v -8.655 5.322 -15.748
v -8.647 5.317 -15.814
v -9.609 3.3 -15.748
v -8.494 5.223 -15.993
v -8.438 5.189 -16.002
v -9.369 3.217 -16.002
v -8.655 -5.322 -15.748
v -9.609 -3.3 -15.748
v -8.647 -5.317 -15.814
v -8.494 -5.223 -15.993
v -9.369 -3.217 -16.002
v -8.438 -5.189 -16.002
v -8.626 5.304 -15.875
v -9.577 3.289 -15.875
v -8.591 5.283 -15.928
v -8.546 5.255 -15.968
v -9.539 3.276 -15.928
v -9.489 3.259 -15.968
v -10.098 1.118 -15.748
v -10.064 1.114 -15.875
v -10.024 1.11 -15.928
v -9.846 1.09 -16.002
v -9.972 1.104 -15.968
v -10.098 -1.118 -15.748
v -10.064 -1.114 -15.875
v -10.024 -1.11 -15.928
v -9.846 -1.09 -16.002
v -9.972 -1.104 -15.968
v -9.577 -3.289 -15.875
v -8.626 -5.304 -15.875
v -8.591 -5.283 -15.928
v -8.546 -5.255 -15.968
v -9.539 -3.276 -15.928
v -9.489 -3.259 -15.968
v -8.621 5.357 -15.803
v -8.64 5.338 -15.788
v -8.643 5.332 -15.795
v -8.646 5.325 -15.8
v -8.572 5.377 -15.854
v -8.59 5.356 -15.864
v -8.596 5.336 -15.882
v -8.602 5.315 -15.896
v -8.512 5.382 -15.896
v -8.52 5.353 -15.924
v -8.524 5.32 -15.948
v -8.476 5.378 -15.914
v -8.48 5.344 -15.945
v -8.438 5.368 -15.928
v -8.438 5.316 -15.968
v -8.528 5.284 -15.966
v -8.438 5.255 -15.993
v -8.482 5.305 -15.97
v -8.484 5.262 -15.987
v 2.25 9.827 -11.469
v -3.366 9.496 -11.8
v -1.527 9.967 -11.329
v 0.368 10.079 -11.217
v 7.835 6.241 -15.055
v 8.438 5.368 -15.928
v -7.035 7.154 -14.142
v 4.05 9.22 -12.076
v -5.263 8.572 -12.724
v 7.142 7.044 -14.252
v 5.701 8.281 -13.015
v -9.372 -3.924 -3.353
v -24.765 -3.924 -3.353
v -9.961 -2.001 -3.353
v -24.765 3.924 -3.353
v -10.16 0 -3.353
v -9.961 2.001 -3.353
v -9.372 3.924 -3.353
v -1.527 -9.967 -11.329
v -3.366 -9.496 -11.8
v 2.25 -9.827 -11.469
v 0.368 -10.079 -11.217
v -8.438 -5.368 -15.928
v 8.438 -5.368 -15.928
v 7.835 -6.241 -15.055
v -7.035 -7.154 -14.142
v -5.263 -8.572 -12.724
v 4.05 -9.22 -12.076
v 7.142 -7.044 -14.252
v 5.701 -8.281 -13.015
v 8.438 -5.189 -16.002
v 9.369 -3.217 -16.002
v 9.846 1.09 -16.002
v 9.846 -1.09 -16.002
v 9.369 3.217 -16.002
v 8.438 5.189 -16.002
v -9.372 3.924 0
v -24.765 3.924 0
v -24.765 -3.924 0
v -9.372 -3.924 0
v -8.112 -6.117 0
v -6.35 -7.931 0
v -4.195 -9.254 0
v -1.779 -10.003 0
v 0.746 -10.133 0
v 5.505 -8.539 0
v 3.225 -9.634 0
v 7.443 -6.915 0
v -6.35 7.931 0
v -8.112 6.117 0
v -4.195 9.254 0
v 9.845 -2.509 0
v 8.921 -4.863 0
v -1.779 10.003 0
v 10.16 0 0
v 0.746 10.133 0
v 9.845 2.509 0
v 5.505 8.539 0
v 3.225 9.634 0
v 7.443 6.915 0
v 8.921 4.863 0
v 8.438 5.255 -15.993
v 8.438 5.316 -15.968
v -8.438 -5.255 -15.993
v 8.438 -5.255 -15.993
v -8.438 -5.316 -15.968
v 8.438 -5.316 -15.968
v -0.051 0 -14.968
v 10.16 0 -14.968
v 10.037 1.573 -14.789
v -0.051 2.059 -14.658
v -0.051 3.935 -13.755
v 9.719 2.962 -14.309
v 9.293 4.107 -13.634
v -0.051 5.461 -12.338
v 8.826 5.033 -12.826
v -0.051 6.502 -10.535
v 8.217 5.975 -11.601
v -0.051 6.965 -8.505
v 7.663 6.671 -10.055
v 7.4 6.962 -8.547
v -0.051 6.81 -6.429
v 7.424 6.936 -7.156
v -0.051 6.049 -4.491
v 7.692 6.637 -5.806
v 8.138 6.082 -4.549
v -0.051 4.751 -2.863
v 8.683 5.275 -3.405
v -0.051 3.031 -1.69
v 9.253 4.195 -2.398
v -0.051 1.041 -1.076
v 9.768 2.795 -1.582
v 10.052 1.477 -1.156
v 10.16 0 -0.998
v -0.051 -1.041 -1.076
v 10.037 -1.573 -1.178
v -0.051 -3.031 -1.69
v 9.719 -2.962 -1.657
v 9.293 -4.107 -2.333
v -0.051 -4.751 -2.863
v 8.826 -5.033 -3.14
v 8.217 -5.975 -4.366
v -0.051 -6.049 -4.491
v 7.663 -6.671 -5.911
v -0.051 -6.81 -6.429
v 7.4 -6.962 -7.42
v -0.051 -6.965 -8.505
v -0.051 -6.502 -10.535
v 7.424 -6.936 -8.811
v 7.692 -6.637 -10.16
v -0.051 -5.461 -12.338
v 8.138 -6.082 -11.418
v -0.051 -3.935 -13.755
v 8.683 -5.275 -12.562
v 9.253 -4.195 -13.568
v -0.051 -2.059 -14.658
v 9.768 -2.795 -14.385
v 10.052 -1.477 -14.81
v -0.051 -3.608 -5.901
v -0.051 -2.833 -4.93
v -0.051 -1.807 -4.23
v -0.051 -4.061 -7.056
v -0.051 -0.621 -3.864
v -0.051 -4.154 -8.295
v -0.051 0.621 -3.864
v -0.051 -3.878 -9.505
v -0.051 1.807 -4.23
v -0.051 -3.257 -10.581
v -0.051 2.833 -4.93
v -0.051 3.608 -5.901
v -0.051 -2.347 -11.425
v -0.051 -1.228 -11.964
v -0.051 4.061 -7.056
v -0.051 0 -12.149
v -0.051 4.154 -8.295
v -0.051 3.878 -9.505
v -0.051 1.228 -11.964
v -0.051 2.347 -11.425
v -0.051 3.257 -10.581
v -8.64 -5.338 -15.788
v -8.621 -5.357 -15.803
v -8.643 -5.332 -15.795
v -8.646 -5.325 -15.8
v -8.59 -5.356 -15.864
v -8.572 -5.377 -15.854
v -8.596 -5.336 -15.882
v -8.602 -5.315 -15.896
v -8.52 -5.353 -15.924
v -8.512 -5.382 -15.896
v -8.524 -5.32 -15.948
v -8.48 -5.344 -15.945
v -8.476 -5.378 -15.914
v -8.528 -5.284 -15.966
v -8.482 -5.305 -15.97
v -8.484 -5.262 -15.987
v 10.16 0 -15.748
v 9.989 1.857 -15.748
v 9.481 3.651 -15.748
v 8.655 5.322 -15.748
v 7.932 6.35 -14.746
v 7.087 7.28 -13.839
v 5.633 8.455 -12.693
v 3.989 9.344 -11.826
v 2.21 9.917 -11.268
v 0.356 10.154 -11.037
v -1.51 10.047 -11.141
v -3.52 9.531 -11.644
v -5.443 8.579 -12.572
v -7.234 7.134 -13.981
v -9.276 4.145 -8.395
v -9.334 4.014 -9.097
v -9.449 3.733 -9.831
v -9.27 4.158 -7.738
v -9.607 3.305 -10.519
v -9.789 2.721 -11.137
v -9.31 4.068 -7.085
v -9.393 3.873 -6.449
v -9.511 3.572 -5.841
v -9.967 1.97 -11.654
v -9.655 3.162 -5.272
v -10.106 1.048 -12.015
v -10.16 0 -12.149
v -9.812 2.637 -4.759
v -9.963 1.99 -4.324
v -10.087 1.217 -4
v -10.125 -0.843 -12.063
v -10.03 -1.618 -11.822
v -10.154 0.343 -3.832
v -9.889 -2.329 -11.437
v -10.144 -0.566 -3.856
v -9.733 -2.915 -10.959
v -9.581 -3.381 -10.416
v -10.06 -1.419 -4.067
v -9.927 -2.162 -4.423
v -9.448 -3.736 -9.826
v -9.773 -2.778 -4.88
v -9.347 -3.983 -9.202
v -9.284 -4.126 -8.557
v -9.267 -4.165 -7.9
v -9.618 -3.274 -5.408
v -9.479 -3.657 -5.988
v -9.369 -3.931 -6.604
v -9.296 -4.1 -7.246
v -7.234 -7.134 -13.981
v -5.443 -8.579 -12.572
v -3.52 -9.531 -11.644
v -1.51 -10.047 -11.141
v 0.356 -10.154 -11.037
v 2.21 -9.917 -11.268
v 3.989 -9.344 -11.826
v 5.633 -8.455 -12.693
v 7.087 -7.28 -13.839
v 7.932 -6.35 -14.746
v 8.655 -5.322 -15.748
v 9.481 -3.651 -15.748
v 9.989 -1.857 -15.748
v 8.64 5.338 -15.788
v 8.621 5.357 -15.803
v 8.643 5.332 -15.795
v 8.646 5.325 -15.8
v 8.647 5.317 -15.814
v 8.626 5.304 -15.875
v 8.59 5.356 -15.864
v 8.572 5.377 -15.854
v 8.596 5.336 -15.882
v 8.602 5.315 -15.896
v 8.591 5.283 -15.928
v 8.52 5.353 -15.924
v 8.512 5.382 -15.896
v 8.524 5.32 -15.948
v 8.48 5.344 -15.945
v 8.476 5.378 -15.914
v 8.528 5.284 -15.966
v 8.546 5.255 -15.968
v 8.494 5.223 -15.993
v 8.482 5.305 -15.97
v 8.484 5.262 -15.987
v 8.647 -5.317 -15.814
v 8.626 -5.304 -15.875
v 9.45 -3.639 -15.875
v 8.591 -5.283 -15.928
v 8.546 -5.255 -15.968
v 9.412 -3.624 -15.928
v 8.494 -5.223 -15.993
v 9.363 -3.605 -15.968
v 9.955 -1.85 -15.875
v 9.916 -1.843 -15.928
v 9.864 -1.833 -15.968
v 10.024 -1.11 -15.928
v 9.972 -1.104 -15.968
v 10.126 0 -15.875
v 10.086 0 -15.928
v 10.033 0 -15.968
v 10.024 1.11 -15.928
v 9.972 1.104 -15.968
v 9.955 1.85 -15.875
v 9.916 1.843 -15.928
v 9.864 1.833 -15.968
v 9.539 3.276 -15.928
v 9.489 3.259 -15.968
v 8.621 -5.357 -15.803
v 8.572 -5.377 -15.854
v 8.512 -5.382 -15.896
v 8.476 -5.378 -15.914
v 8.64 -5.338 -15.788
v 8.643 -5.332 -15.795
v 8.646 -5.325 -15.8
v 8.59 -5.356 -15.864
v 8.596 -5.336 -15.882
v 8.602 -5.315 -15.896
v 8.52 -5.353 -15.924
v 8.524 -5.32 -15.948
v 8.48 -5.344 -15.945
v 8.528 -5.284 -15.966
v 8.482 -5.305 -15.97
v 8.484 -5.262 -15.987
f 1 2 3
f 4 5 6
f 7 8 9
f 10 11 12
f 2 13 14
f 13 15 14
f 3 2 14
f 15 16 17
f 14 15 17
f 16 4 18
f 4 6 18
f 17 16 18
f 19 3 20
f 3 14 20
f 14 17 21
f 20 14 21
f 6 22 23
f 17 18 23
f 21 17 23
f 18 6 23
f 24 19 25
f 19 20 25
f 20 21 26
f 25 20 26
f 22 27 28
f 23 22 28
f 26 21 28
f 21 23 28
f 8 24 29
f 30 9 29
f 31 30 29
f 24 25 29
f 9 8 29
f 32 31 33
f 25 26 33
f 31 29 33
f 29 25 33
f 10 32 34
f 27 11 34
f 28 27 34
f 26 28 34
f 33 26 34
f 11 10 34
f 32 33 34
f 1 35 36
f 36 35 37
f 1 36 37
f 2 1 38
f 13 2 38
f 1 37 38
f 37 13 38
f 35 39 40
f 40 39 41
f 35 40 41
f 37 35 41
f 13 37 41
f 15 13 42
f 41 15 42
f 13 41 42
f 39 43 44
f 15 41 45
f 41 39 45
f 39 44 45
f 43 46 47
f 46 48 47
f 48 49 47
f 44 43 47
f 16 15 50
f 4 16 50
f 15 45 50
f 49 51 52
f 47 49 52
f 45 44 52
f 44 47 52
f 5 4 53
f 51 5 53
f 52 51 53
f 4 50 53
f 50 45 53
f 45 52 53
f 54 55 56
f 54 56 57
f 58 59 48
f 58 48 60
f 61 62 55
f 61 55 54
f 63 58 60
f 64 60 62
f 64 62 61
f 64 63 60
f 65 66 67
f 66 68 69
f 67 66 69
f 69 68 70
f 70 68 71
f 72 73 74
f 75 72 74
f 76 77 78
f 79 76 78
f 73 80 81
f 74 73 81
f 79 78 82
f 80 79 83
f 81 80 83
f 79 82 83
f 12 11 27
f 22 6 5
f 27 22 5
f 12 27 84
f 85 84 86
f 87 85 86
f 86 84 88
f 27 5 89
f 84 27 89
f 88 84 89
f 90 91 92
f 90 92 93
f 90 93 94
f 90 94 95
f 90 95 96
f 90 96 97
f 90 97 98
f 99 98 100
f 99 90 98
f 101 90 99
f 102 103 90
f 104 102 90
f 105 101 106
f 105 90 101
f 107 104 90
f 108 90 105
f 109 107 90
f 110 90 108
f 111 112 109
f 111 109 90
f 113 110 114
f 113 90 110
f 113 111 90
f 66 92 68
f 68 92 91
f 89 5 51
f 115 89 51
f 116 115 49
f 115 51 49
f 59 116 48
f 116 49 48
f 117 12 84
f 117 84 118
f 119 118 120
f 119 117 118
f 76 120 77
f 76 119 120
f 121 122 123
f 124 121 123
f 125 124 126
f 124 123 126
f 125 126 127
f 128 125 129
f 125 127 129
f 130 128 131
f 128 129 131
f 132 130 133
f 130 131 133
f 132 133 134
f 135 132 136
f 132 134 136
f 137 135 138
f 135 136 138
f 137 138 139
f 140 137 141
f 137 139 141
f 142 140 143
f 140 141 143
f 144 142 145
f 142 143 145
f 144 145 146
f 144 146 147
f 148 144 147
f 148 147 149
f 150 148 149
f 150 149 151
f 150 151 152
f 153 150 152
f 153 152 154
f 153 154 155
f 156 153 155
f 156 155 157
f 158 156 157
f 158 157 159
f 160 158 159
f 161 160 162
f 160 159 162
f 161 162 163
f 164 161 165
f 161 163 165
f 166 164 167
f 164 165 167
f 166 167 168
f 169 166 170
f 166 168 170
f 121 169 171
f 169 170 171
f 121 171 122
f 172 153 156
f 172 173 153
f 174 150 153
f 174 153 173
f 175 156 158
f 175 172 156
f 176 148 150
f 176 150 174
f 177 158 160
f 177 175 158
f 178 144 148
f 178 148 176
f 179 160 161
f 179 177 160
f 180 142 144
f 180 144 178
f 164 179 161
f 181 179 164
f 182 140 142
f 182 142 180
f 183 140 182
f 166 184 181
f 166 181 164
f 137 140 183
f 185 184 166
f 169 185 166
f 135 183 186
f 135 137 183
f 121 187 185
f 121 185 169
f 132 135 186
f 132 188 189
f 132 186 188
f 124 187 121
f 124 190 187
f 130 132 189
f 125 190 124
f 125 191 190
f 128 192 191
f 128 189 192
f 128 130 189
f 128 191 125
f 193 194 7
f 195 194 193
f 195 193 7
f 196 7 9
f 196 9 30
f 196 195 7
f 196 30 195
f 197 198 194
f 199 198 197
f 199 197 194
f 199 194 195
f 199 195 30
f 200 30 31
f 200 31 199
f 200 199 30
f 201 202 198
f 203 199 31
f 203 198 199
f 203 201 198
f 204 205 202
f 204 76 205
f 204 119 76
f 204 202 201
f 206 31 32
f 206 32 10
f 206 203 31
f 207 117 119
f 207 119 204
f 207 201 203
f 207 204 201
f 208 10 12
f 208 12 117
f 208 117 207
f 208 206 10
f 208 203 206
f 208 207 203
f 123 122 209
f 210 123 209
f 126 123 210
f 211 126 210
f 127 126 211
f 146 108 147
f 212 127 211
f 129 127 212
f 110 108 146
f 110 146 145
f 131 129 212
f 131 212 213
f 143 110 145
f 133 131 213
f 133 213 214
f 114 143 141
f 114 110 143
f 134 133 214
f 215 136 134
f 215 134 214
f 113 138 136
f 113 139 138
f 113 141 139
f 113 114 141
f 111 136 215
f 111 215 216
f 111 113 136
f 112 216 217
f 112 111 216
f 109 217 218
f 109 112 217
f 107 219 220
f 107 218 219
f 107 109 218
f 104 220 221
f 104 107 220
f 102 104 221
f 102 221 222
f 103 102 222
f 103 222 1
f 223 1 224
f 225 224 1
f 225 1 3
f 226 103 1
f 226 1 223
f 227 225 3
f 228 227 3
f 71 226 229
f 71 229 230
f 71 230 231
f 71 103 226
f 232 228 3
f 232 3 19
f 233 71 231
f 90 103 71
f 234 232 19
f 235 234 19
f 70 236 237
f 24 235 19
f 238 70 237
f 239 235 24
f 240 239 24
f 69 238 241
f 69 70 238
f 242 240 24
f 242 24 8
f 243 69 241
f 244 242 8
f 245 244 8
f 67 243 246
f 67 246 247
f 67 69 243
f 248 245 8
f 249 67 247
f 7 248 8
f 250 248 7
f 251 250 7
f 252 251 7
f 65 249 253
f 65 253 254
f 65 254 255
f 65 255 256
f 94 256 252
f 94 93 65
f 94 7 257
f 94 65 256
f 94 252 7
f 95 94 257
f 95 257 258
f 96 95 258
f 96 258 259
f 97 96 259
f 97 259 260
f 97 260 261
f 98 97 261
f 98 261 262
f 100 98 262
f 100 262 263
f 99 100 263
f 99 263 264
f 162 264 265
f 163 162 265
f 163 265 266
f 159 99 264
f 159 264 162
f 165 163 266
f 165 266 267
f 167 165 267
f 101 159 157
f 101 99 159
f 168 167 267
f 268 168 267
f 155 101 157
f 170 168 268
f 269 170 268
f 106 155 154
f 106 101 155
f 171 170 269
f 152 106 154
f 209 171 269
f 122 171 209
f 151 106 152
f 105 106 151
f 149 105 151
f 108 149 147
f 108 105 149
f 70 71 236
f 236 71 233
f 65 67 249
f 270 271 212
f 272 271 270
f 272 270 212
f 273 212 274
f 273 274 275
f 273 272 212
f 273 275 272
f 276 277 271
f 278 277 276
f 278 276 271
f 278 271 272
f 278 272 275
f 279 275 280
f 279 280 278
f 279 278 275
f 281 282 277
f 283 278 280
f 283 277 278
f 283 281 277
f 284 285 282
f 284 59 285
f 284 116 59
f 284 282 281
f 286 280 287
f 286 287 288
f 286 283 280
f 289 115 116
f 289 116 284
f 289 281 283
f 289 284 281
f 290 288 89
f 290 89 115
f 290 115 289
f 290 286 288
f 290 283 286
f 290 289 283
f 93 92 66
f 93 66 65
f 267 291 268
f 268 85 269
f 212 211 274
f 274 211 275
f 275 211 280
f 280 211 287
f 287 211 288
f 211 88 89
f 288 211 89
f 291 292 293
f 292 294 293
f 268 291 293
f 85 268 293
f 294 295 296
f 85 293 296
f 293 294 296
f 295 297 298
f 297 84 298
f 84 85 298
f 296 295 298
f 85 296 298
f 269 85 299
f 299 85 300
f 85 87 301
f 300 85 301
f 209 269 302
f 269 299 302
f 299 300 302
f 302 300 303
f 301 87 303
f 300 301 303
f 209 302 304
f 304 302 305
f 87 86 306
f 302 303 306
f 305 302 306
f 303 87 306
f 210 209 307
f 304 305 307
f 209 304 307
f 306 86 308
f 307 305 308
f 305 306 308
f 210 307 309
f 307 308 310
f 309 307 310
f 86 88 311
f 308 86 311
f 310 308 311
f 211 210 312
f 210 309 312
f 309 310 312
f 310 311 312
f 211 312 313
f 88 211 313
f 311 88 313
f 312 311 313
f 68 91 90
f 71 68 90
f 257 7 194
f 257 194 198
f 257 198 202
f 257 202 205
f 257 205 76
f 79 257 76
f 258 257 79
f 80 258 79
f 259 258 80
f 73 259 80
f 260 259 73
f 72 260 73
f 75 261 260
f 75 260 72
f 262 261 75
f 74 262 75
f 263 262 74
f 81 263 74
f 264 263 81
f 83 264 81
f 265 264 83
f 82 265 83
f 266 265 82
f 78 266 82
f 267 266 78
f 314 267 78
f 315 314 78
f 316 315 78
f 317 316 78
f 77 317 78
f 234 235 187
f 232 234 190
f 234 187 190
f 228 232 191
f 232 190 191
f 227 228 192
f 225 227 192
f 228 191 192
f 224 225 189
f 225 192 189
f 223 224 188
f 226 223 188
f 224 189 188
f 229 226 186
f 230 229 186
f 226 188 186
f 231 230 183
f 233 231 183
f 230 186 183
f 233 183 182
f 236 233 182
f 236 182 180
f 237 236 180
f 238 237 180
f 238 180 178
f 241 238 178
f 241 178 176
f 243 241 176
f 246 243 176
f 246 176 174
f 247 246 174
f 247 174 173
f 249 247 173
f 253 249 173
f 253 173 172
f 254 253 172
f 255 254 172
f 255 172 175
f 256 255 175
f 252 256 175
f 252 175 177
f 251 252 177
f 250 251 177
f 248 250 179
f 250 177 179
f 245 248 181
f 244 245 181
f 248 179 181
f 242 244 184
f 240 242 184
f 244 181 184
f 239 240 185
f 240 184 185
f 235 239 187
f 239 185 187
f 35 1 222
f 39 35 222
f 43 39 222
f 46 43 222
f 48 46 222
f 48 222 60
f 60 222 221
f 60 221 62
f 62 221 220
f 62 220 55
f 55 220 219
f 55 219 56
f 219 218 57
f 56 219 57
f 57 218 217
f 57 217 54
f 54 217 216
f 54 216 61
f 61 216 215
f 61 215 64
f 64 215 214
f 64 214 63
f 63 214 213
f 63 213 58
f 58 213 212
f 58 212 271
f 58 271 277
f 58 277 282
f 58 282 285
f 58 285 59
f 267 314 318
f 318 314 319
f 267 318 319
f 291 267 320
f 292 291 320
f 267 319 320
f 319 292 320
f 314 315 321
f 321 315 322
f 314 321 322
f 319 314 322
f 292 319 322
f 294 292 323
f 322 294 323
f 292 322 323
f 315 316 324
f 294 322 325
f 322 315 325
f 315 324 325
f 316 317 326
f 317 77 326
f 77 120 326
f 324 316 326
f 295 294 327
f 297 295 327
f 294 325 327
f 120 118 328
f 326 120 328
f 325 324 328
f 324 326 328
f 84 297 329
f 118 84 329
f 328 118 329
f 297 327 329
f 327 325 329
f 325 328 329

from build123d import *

# Parameters (mm, degrees)
SKETCH1_R                = 10.16
PART_DIA_EXTRUDE_DEPTH   = 16.002
SKETCH1_3_W              = 24.765
SKETCH1_3_H              = 7.8486
ARM_EXTRUDE_DEPTH        = 3.3528
SKETCH2_R                = 6.985
CBORE_EXTRUDE_DEPTH      = 10.2108
SKETCH2_3_R              = 4.1656
THRU_HOLE_EXTRUDE2_DEPTH = 40.737202144
ANGLE_EXTRUDE3_DEPTH     = 40.737202144
FILLET1_R                = 0.254


with BuildPart() as part:
    # Sketch1 → PART DIA EXTRUDE (new body)
    with BuildSketch(Plane.XY):
        Circle(SKETCH1_R)
    extrude(amount=-PART_DIA_EXTRUDE_DEPTH)

    # Sketch1<3> → ARM EXTRUDE (add)
    with BuildSketch(Plane.XY):
        with Locations((-12.3825, 0)):
            Rectangle(SKETCH1_3_W, SKETCH1_3_H)
    extrude(amount=-ARM_EXTRUDE_DEPTH)

    # Sketch2 → CBORE EXTRUDE (cut)
    with BuildSketch(Plane(origin=(10.16, 0, 0), x_dir=(0, 0, -1), z_dir=(1, 0, 0))):
        with Locations((7.983336866, 0)):
            Circle(SKETCH2_R)
    extrude(amount=-CBORE_EXTRUDE_DEPTH, mode=Mode.SUBTRACT)

    # Sketch2<3> → THRU HOLE-Extrude2 (cut, through all)
    with BuildSketch(Plane(origin=(10.16, 0, 0), x_dir=(0, 0, -1), z_dir=(1, 0, 0))):
        with Locations((7.983336866, 0)):
            Circle(SKETCH2_3_R)
    extrude(amount=-THRU_HOLE_EXTRUDE2_DEPTH, mode=Mode.SUBTRACT)

    # Sketch2<4> → ANGLE-Extrude3 (cut, through all)
    with BuildSketch(Plane(origin=(10.16, 0, 0), x_dir=(0, 0, -1), z_dir=(1, 0, 0))):
        Polygon((11.136104206, 10.16), (16.002, 10.16), (16.002, 5.294104206), align=None)
        Polygon((16.002, -10.16), (16.002, -5.294104206), (11.136104206, -10.16), align=None)
    extrude(amount=-ANGLE_EXTRUDE3_DEPTH, mode=Mode.SUBTRACT)

    # Fillet1
    fillet1_edges = [part.edges().sort_by_distance(p)[0] for p in [
        (-10.16, 0, -16.002),
        (0, 5.294104206, -16.002),
        (-5.323615412, 8.653595723, -12.642508482),
        (9.780845679, -2.749665034, -16.002),
        (0, -5.294104206, -16.002),
        (-5.323615412, -8.653595723, -12.642508482),
    ]]
    fillet(fillet1_edges, radius=FILLET1_R)


solid = part.part
